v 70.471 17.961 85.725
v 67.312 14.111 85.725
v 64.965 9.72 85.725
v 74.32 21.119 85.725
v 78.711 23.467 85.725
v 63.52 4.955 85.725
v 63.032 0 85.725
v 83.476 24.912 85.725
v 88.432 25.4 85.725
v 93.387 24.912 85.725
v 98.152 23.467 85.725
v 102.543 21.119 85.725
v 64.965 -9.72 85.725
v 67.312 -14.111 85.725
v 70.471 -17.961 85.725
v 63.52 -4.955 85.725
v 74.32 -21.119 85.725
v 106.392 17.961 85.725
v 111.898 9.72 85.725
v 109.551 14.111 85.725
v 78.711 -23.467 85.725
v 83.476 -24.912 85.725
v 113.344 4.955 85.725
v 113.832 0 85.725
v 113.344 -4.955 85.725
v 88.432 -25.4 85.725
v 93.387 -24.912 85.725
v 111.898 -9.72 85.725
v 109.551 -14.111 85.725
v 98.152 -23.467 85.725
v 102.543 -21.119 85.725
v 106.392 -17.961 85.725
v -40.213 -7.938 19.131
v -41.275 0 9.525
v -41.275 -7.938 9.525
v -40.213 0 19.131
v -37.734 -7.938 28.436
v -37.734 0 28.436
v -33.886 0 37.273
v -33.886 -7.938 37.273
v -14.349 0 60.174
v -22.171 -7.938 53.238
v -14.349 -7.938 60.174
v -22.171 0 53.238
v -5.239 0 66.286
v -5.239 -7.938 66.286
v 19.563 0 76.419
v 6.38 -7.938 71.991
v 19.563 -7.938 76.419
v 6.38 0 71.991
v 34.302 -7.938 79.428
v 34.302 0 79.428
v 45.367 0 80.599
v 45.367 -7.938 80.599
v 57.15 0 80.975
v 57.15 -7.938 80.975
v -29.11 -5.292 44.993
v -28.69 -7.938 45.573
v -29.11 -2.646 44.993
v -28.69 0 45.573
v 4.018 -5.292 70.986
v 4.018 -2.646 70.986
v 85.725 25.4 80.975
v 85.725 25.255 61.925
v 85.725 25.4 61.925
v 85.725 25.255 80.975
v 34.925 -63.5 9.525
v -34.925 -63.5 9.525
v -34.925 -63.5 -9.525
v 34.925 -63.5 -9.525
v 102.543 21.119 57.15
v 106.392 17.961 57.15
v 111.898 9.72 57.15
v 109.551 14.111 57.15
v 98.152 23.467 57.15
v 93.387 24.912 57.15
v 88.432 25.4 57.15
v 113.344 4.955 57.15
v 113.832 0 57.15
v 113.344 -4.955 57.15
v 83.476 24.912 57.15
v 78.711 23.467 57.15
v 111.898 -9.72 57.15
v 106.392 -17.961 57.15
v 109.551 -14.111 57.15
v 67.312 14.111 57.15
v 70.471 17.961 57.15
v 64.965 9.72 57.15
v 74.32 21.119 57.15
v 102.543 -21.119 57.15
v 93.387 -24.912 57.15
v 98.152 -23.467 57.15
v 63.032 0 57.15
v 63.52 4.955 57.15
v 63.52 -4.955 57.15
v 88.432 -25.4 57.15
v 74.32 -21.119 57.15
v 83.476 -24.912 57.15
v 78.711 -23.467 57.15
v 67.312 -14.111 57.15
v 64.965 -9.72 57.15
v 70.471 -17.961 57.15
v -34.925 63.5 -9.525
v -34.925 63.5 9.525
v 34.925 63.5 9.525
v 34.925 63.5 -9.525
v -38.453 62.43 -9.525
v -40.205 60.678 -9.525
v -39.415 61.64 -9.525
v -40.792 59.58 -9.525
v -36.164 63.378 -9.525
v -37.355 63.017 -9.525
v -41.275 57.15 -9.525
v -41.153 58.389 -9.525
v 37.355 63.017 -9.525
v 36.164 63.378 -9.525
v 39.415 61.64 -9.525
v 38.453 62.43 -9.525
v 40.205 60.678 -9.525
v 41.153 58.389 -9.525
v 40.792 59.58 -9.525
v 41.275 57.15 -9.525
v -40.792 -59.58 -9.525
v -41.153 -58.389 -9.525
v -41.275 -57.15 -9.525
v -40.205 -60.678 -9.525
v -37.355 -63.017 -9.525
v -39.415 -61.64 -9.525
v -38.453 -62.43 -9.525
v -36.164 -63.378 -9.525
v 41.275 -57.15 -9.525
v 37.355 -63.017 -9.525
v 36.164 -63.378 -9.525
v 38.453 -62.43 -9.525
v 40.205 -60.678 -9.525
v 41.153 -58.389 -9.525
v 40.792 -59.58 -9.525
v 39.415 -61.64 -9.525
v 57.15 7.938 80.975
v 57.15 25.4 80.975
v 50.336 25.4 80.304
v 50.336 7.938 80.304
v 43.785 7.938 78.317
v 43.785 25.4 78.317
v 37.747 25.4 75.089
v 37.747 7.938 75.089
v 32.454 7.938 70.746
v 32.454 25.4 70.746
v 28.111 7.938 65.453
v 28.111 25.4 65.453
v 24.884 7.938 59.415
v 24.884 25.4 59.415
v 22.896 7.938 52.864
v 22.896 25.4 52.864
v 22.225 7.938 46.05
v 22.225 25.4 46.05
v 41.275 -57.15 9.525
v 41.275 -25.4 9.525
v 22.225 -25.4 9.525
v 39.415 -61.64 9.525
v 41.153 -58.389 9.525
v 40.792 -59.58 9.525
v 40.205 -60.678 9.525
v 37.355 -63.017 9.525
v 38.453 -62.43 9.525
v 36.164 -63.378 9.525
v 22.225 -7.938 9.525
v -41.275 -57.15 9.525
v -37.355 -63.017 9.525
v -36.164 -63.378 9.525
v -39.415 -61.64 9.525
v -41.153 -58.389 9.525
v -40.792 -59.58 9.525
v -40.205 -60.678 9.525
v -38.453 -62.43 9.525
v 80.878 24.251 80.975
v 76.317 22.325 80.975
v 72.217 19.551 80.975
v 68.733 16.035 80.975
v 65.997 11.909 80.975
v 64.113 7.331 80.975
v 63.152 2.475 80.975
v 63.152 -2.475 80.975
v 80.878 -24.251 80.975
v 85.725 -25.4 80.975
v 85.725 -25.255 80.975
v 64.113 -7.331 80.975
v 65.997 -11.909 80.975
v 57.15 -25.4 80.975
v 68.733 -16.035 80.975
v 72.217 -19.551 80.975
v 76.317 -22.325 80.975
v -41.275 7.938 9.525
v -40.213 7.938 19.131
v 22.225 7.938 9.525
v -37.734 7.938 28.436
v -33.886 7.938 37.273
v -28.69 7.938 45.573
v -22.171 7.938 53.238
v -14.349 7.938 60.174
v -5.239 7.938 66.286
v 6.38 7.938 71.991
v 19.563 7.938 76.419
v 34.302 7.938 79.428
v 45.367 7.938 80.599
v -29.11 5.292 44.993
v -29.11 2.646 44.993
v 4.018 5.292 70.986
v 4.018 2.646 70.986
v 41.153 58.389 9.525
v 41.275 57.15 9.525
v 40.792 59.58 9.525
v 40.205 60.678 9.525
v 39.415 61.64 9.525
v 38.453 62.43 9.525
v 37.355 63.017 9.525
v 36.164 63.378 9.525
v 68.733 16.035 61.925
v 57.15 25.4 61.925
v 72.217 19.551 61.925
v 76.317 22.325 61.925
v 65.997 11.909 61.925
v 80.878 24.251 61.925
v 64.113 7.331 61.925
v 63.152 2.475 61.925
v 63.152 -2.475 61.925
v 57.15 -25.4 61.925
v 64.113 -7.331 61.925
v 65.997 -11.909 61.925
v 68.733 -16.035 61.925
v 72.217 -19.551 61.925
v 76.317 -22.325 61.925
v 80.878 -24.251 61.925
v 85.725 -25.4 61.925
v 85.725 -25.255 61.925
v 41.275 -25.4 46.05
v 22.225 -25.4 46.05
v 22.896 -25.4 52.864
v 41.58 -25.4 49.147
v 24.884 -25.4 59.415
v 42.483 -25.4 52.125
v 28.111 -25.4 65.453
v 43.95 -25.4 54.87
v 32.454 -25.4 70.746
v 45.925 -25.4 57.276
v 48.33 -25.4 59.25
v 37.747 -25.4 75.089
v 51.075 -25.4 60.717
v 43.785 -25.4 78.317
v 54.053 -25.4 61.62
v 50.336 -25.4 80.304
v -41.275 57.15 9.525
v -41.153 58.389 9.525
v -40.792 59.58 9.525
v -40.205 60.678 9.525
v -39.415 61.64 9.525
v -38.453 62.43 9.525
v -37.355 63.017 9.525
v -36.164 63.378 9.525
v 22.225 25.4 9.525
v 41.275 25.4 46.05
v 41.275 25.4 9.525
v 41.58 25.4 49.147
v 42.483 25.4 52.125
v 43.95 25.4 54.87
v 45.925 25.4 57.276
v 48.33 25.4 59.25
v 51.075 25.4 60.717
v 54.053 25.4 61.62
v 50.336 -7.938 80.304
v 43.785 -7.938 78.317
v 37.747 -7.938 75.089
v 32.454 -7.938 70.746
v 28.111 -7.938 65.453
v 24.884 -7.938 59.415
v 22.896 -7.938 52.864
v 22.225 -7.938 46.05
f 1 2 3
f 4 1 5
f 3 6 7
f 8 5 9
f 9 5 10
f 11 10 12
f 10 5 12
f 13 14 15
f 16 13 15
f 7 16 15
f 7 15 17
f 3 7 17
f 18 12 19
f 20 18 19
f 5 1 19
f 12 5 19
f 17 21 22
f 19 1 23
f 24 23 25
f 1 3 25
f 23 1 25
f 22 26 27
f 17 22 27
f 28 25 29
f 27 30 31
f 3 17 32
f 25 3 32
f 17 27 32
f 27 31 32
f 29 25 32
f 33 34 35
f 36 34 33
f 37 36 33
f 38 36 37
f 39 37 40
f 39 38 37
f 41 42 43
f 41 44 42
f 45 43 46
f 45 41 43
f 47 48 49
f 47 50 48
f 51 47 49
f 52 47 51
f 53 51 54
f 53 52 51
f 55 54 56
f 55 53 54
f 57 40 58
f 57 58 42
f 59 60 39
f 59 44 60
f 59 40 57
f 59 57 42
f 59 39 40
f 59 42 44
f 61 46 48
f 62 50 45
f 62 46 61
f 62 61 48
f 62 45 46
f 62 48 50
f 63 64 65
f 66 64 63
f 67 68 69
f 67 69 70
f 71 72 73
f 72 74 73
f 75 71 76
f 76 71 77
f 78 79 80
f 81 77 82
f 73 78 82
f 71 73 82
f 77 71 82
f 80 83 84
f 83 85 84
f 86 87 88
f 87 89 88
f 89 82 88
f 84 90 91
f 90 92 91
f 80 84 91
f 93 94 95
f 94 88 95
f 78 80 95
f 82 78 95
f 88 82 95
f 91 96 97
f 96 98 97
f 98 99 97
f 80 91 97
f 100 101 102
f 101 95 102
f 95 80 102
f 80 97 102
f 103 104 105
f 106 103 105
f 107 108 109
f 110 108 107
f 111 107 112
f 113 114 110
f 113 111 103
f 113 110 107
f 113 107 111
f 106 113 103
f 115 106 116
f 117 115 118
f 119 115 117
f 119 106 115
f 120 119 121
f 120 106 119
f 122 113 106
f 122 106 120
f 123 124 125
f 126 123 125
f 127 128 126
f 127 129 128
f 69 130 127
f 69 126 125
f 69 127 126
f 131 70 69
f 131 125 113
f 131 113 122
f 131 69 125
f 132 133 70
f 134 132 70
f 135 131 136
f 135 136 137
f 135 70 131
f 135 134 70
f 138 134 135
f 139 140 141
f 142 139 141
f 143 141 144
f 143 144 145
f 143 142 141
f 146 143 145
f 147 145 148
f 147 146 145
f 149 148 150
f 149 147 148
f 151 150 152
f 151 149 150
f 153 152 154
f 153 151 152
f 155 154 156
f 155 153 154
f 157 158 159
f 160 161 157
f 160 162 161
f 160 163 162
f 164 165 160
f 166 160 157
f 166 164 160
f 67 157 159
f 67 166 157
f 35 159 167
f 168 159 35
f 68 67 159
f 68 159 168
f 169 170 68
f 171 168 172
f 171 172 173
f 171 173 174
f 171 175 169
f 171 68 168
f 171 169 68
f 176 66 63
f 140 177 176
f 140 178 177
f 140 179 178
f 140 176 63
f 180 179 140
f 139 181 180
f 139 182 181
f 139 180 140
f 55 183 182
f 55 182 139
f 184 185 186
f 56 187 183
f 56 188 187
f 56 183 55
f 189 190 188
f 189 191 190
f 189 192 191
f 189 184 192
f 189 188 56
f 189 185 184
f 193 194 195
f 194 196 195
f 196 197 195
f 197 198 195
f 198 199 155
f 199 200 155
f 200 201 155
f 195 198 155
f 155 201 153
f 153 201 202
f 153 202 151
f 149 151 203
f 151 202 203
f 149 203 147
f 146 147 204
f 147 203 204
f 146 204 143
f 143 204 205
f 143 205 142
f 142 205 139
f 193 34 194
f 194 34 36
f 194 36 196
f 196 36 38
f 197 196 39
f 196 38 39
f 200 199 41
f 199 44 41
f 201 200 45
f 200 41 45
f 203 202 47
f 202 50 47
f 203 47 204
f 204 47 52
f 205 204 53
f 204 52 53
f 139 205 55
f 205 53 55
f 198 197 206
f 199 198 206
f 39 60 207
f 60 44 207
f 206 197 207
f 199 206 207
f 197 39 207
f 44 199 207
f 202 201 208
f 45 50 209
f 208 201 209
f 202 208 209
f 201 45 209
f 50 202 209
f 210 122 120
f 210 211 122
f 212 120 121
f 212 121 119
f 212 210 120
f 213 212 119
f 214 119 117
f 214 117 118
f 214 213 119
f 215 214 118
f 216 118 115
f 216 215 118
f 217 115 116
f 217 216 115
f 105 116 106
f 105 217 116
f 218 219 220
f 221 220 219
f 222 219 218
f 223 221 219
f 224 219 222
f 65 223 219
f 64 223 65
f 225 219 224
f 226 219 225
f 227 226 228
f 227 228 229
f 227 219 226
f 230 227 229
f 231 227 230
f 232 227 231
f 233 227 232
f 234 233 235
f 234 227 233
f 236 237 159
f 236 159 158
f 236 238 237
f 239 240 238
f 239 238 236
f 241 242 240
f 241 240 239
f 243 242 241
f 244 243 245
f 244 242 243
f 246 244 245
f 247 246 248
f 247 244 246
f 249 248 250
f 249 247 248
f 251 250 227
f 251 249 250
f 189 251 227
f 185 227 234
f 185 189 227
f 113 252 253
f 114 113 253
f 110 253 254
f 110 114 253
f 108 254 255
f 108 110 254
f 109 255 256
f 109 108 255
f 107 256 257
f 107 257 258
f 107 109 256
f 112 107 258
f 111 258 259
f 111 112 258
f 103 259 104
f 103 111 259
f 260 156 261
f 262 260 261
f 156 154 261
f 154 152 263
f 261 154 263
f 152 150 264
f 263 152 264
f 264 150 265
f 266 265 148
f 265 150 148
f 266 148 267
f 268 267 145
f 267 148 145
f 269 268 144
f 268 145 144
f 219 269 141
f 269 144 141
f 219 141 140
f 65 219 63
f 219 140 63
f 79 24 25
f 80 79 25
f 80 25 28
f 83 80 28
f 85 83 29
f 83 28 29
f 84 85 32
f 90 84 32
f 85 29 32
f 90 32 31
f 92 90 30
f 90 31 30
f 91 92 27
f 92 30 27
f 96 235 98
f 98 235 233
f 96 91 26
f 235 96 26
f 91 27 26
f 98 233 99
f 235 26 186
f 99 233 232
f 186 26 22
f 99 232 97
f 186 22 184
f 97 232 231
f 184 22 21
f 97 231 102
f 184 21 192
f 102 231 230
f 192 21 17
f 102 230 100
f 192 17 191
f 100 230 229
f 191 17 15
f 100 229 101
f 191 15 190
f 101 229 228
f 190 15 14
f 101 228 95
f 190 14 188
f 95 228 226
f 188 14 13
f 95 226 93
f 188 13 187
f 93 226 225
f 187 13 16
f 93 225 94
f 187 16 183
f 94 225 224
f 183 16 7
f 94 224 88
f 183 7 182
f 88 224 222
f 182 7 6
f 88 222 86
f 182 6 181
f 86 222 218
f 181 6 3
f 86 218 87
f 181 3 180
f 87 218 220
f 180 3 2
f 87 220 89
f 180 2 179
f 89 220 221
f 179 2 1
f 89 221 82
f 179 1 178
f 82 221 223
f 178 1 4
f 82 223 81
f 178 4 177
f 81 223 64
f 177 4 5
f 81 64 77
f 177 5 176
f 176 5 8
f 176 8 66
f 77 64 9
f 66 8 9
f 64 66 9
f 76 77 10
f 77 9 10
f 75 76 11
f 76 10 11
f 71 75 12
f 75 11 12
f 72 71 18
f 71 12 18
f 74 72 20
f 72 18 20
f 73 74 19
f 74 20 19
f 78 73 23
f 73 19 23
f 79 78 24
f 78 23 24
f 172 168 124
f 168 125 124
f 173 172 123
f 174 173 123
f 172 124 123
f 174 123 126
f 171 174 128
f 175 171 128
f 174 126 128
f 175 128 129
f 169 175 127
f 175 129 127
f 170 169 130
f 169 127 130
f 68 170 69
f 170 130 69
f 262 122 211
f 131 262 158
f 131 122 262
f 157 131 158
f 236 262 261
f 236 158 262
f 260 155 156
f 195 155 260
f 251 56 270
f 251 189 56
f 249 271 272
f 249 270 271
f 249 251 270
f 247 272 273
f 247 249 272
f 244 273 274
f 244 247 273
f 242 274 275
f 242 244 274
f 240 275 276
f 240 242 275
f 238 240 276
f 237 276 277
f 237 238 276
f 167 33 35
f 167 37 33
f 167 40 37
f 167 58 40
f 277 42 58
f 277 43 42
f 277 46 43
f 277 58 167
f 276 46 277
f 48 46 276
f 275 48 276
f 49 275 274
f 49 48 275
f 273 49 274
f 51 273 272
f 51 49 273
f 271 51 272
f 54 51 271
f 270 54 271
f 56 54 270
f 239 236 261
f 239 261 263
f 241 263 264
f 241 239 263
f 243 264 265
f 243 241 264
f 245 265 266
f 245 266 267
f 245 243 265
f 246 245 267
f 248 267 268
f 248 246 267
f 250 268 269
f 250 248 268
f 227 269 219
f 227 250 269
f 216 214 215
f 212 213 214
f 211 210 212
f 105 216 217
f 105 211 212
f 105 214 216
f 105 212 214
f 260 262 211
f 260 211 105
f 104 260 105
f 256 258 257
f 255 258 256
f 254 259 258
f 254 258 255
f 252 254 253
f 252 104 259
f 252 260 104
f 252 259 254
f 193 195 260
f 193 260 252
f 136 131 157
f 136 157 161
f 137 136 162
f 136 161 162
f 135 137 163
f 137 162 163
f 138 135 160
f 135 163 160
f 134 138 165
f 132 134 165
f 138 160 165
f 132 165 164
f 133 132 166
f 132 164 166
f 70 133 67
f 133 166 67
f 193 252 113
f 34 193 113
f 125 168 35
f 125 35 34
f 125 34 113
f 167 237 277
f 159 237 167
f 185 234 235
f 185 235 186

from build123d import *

# Parameters (mm, degrees)
F1_DEPTH = 63.5
F0_W     = 22.693397
F0_H     = 19.05
F2_DEPTH = 25.4
F3_DEPTH = 7.9375
F5_R     = 6.35


with BuildPart() as f1:
    # F0 (on Front) → F1 (new body, symmetric)
    with BuildSketch(Plane.XZ):
        Polygon((41.275, -9.525), (41.275, 9.525), (22.225, 9.525), (-41.275, 9.525), (-41.275, -9.525), align=None)
    extrude(amount=F1_DEPTH, both=True)

    # F0 (on Front) → F2 (join, symmetric)
    with BuildSketch(Plane.XZ):
        with BuildLine():
            Line((22.225, 9.525), (41.275, 9.525))
            Line((41.275, 9.525), (41.275, 46.0502))
            ThreePointArc((41.275, 46.0502), (45.92468, 57.27552), (57.15, 61.9252))
            Line((57.15, 61.9252), (63.031603, 61.9252))
            Line((63.031603, 61.9252), (63.031603, 80.9752))
            Line((63.031603, 80.9752), (57.15, 80.9752))
            ThreePointArc((57.15, 80.9752), (32.454296, 70.745904), (22.225, 46.0502))
            Line((22.225, 46.0502), (22.225, 9.525))
        make_face()
        with Locations((74.378301, 71.4502)):
            Rectangle(F0_W, F0_H)
    extrude(amount=F2_DEPTH, both=True)

    # F0 (on Front) → F3 (join, symmetric)
    with BuildSketch(Plane.XZ):
        with BuildLine():
            Line((-41.275, 9.525), (22.225, 9.525))
            Line((22.225, 9.525), (22.225, 46.0502))
            ThreePointArc((22.225, 46.0502), (32.454296, 70.745904), (57.15, 80.9752))
            add(Edge.make_bspline(
                [(-41.275, 9.525), (-39.910629, 47.554985), (-5.663922, 81.163555), (57.15, 80.9752)],
                knots=[0, 0, 0, 0, 121.624881, 121.624881, 121.624881, 121.624881], degree=3))
        make_face()
    extrude(amount=F3_DEPTH, both=True)

    # F0 (on Front) → F4 (revolve)
    with BuildSketch(Plane.XZ):
        Polygon((88.431603, 71.4375), (88.431603, 57.15), (113.831603, 57.15), (113.831603, 85.725), (88.431603, 85.725), align=None)
    revolve(axis=Axis((88.431603, 0, 64.29375), (0, 0, -1)))

    # F5
    f5_edges = [f1.edges().sort_by_distance(p)[0] for p in [
        (-41.275, 63.5, 0),
        (-41.275, -63.5, 0),
        (41.275, -63.5, 0),
        (41.275, 63.5, 0),
    ]]
    fillet(f5_edges, radius=F5_R)


solid = f1.part
